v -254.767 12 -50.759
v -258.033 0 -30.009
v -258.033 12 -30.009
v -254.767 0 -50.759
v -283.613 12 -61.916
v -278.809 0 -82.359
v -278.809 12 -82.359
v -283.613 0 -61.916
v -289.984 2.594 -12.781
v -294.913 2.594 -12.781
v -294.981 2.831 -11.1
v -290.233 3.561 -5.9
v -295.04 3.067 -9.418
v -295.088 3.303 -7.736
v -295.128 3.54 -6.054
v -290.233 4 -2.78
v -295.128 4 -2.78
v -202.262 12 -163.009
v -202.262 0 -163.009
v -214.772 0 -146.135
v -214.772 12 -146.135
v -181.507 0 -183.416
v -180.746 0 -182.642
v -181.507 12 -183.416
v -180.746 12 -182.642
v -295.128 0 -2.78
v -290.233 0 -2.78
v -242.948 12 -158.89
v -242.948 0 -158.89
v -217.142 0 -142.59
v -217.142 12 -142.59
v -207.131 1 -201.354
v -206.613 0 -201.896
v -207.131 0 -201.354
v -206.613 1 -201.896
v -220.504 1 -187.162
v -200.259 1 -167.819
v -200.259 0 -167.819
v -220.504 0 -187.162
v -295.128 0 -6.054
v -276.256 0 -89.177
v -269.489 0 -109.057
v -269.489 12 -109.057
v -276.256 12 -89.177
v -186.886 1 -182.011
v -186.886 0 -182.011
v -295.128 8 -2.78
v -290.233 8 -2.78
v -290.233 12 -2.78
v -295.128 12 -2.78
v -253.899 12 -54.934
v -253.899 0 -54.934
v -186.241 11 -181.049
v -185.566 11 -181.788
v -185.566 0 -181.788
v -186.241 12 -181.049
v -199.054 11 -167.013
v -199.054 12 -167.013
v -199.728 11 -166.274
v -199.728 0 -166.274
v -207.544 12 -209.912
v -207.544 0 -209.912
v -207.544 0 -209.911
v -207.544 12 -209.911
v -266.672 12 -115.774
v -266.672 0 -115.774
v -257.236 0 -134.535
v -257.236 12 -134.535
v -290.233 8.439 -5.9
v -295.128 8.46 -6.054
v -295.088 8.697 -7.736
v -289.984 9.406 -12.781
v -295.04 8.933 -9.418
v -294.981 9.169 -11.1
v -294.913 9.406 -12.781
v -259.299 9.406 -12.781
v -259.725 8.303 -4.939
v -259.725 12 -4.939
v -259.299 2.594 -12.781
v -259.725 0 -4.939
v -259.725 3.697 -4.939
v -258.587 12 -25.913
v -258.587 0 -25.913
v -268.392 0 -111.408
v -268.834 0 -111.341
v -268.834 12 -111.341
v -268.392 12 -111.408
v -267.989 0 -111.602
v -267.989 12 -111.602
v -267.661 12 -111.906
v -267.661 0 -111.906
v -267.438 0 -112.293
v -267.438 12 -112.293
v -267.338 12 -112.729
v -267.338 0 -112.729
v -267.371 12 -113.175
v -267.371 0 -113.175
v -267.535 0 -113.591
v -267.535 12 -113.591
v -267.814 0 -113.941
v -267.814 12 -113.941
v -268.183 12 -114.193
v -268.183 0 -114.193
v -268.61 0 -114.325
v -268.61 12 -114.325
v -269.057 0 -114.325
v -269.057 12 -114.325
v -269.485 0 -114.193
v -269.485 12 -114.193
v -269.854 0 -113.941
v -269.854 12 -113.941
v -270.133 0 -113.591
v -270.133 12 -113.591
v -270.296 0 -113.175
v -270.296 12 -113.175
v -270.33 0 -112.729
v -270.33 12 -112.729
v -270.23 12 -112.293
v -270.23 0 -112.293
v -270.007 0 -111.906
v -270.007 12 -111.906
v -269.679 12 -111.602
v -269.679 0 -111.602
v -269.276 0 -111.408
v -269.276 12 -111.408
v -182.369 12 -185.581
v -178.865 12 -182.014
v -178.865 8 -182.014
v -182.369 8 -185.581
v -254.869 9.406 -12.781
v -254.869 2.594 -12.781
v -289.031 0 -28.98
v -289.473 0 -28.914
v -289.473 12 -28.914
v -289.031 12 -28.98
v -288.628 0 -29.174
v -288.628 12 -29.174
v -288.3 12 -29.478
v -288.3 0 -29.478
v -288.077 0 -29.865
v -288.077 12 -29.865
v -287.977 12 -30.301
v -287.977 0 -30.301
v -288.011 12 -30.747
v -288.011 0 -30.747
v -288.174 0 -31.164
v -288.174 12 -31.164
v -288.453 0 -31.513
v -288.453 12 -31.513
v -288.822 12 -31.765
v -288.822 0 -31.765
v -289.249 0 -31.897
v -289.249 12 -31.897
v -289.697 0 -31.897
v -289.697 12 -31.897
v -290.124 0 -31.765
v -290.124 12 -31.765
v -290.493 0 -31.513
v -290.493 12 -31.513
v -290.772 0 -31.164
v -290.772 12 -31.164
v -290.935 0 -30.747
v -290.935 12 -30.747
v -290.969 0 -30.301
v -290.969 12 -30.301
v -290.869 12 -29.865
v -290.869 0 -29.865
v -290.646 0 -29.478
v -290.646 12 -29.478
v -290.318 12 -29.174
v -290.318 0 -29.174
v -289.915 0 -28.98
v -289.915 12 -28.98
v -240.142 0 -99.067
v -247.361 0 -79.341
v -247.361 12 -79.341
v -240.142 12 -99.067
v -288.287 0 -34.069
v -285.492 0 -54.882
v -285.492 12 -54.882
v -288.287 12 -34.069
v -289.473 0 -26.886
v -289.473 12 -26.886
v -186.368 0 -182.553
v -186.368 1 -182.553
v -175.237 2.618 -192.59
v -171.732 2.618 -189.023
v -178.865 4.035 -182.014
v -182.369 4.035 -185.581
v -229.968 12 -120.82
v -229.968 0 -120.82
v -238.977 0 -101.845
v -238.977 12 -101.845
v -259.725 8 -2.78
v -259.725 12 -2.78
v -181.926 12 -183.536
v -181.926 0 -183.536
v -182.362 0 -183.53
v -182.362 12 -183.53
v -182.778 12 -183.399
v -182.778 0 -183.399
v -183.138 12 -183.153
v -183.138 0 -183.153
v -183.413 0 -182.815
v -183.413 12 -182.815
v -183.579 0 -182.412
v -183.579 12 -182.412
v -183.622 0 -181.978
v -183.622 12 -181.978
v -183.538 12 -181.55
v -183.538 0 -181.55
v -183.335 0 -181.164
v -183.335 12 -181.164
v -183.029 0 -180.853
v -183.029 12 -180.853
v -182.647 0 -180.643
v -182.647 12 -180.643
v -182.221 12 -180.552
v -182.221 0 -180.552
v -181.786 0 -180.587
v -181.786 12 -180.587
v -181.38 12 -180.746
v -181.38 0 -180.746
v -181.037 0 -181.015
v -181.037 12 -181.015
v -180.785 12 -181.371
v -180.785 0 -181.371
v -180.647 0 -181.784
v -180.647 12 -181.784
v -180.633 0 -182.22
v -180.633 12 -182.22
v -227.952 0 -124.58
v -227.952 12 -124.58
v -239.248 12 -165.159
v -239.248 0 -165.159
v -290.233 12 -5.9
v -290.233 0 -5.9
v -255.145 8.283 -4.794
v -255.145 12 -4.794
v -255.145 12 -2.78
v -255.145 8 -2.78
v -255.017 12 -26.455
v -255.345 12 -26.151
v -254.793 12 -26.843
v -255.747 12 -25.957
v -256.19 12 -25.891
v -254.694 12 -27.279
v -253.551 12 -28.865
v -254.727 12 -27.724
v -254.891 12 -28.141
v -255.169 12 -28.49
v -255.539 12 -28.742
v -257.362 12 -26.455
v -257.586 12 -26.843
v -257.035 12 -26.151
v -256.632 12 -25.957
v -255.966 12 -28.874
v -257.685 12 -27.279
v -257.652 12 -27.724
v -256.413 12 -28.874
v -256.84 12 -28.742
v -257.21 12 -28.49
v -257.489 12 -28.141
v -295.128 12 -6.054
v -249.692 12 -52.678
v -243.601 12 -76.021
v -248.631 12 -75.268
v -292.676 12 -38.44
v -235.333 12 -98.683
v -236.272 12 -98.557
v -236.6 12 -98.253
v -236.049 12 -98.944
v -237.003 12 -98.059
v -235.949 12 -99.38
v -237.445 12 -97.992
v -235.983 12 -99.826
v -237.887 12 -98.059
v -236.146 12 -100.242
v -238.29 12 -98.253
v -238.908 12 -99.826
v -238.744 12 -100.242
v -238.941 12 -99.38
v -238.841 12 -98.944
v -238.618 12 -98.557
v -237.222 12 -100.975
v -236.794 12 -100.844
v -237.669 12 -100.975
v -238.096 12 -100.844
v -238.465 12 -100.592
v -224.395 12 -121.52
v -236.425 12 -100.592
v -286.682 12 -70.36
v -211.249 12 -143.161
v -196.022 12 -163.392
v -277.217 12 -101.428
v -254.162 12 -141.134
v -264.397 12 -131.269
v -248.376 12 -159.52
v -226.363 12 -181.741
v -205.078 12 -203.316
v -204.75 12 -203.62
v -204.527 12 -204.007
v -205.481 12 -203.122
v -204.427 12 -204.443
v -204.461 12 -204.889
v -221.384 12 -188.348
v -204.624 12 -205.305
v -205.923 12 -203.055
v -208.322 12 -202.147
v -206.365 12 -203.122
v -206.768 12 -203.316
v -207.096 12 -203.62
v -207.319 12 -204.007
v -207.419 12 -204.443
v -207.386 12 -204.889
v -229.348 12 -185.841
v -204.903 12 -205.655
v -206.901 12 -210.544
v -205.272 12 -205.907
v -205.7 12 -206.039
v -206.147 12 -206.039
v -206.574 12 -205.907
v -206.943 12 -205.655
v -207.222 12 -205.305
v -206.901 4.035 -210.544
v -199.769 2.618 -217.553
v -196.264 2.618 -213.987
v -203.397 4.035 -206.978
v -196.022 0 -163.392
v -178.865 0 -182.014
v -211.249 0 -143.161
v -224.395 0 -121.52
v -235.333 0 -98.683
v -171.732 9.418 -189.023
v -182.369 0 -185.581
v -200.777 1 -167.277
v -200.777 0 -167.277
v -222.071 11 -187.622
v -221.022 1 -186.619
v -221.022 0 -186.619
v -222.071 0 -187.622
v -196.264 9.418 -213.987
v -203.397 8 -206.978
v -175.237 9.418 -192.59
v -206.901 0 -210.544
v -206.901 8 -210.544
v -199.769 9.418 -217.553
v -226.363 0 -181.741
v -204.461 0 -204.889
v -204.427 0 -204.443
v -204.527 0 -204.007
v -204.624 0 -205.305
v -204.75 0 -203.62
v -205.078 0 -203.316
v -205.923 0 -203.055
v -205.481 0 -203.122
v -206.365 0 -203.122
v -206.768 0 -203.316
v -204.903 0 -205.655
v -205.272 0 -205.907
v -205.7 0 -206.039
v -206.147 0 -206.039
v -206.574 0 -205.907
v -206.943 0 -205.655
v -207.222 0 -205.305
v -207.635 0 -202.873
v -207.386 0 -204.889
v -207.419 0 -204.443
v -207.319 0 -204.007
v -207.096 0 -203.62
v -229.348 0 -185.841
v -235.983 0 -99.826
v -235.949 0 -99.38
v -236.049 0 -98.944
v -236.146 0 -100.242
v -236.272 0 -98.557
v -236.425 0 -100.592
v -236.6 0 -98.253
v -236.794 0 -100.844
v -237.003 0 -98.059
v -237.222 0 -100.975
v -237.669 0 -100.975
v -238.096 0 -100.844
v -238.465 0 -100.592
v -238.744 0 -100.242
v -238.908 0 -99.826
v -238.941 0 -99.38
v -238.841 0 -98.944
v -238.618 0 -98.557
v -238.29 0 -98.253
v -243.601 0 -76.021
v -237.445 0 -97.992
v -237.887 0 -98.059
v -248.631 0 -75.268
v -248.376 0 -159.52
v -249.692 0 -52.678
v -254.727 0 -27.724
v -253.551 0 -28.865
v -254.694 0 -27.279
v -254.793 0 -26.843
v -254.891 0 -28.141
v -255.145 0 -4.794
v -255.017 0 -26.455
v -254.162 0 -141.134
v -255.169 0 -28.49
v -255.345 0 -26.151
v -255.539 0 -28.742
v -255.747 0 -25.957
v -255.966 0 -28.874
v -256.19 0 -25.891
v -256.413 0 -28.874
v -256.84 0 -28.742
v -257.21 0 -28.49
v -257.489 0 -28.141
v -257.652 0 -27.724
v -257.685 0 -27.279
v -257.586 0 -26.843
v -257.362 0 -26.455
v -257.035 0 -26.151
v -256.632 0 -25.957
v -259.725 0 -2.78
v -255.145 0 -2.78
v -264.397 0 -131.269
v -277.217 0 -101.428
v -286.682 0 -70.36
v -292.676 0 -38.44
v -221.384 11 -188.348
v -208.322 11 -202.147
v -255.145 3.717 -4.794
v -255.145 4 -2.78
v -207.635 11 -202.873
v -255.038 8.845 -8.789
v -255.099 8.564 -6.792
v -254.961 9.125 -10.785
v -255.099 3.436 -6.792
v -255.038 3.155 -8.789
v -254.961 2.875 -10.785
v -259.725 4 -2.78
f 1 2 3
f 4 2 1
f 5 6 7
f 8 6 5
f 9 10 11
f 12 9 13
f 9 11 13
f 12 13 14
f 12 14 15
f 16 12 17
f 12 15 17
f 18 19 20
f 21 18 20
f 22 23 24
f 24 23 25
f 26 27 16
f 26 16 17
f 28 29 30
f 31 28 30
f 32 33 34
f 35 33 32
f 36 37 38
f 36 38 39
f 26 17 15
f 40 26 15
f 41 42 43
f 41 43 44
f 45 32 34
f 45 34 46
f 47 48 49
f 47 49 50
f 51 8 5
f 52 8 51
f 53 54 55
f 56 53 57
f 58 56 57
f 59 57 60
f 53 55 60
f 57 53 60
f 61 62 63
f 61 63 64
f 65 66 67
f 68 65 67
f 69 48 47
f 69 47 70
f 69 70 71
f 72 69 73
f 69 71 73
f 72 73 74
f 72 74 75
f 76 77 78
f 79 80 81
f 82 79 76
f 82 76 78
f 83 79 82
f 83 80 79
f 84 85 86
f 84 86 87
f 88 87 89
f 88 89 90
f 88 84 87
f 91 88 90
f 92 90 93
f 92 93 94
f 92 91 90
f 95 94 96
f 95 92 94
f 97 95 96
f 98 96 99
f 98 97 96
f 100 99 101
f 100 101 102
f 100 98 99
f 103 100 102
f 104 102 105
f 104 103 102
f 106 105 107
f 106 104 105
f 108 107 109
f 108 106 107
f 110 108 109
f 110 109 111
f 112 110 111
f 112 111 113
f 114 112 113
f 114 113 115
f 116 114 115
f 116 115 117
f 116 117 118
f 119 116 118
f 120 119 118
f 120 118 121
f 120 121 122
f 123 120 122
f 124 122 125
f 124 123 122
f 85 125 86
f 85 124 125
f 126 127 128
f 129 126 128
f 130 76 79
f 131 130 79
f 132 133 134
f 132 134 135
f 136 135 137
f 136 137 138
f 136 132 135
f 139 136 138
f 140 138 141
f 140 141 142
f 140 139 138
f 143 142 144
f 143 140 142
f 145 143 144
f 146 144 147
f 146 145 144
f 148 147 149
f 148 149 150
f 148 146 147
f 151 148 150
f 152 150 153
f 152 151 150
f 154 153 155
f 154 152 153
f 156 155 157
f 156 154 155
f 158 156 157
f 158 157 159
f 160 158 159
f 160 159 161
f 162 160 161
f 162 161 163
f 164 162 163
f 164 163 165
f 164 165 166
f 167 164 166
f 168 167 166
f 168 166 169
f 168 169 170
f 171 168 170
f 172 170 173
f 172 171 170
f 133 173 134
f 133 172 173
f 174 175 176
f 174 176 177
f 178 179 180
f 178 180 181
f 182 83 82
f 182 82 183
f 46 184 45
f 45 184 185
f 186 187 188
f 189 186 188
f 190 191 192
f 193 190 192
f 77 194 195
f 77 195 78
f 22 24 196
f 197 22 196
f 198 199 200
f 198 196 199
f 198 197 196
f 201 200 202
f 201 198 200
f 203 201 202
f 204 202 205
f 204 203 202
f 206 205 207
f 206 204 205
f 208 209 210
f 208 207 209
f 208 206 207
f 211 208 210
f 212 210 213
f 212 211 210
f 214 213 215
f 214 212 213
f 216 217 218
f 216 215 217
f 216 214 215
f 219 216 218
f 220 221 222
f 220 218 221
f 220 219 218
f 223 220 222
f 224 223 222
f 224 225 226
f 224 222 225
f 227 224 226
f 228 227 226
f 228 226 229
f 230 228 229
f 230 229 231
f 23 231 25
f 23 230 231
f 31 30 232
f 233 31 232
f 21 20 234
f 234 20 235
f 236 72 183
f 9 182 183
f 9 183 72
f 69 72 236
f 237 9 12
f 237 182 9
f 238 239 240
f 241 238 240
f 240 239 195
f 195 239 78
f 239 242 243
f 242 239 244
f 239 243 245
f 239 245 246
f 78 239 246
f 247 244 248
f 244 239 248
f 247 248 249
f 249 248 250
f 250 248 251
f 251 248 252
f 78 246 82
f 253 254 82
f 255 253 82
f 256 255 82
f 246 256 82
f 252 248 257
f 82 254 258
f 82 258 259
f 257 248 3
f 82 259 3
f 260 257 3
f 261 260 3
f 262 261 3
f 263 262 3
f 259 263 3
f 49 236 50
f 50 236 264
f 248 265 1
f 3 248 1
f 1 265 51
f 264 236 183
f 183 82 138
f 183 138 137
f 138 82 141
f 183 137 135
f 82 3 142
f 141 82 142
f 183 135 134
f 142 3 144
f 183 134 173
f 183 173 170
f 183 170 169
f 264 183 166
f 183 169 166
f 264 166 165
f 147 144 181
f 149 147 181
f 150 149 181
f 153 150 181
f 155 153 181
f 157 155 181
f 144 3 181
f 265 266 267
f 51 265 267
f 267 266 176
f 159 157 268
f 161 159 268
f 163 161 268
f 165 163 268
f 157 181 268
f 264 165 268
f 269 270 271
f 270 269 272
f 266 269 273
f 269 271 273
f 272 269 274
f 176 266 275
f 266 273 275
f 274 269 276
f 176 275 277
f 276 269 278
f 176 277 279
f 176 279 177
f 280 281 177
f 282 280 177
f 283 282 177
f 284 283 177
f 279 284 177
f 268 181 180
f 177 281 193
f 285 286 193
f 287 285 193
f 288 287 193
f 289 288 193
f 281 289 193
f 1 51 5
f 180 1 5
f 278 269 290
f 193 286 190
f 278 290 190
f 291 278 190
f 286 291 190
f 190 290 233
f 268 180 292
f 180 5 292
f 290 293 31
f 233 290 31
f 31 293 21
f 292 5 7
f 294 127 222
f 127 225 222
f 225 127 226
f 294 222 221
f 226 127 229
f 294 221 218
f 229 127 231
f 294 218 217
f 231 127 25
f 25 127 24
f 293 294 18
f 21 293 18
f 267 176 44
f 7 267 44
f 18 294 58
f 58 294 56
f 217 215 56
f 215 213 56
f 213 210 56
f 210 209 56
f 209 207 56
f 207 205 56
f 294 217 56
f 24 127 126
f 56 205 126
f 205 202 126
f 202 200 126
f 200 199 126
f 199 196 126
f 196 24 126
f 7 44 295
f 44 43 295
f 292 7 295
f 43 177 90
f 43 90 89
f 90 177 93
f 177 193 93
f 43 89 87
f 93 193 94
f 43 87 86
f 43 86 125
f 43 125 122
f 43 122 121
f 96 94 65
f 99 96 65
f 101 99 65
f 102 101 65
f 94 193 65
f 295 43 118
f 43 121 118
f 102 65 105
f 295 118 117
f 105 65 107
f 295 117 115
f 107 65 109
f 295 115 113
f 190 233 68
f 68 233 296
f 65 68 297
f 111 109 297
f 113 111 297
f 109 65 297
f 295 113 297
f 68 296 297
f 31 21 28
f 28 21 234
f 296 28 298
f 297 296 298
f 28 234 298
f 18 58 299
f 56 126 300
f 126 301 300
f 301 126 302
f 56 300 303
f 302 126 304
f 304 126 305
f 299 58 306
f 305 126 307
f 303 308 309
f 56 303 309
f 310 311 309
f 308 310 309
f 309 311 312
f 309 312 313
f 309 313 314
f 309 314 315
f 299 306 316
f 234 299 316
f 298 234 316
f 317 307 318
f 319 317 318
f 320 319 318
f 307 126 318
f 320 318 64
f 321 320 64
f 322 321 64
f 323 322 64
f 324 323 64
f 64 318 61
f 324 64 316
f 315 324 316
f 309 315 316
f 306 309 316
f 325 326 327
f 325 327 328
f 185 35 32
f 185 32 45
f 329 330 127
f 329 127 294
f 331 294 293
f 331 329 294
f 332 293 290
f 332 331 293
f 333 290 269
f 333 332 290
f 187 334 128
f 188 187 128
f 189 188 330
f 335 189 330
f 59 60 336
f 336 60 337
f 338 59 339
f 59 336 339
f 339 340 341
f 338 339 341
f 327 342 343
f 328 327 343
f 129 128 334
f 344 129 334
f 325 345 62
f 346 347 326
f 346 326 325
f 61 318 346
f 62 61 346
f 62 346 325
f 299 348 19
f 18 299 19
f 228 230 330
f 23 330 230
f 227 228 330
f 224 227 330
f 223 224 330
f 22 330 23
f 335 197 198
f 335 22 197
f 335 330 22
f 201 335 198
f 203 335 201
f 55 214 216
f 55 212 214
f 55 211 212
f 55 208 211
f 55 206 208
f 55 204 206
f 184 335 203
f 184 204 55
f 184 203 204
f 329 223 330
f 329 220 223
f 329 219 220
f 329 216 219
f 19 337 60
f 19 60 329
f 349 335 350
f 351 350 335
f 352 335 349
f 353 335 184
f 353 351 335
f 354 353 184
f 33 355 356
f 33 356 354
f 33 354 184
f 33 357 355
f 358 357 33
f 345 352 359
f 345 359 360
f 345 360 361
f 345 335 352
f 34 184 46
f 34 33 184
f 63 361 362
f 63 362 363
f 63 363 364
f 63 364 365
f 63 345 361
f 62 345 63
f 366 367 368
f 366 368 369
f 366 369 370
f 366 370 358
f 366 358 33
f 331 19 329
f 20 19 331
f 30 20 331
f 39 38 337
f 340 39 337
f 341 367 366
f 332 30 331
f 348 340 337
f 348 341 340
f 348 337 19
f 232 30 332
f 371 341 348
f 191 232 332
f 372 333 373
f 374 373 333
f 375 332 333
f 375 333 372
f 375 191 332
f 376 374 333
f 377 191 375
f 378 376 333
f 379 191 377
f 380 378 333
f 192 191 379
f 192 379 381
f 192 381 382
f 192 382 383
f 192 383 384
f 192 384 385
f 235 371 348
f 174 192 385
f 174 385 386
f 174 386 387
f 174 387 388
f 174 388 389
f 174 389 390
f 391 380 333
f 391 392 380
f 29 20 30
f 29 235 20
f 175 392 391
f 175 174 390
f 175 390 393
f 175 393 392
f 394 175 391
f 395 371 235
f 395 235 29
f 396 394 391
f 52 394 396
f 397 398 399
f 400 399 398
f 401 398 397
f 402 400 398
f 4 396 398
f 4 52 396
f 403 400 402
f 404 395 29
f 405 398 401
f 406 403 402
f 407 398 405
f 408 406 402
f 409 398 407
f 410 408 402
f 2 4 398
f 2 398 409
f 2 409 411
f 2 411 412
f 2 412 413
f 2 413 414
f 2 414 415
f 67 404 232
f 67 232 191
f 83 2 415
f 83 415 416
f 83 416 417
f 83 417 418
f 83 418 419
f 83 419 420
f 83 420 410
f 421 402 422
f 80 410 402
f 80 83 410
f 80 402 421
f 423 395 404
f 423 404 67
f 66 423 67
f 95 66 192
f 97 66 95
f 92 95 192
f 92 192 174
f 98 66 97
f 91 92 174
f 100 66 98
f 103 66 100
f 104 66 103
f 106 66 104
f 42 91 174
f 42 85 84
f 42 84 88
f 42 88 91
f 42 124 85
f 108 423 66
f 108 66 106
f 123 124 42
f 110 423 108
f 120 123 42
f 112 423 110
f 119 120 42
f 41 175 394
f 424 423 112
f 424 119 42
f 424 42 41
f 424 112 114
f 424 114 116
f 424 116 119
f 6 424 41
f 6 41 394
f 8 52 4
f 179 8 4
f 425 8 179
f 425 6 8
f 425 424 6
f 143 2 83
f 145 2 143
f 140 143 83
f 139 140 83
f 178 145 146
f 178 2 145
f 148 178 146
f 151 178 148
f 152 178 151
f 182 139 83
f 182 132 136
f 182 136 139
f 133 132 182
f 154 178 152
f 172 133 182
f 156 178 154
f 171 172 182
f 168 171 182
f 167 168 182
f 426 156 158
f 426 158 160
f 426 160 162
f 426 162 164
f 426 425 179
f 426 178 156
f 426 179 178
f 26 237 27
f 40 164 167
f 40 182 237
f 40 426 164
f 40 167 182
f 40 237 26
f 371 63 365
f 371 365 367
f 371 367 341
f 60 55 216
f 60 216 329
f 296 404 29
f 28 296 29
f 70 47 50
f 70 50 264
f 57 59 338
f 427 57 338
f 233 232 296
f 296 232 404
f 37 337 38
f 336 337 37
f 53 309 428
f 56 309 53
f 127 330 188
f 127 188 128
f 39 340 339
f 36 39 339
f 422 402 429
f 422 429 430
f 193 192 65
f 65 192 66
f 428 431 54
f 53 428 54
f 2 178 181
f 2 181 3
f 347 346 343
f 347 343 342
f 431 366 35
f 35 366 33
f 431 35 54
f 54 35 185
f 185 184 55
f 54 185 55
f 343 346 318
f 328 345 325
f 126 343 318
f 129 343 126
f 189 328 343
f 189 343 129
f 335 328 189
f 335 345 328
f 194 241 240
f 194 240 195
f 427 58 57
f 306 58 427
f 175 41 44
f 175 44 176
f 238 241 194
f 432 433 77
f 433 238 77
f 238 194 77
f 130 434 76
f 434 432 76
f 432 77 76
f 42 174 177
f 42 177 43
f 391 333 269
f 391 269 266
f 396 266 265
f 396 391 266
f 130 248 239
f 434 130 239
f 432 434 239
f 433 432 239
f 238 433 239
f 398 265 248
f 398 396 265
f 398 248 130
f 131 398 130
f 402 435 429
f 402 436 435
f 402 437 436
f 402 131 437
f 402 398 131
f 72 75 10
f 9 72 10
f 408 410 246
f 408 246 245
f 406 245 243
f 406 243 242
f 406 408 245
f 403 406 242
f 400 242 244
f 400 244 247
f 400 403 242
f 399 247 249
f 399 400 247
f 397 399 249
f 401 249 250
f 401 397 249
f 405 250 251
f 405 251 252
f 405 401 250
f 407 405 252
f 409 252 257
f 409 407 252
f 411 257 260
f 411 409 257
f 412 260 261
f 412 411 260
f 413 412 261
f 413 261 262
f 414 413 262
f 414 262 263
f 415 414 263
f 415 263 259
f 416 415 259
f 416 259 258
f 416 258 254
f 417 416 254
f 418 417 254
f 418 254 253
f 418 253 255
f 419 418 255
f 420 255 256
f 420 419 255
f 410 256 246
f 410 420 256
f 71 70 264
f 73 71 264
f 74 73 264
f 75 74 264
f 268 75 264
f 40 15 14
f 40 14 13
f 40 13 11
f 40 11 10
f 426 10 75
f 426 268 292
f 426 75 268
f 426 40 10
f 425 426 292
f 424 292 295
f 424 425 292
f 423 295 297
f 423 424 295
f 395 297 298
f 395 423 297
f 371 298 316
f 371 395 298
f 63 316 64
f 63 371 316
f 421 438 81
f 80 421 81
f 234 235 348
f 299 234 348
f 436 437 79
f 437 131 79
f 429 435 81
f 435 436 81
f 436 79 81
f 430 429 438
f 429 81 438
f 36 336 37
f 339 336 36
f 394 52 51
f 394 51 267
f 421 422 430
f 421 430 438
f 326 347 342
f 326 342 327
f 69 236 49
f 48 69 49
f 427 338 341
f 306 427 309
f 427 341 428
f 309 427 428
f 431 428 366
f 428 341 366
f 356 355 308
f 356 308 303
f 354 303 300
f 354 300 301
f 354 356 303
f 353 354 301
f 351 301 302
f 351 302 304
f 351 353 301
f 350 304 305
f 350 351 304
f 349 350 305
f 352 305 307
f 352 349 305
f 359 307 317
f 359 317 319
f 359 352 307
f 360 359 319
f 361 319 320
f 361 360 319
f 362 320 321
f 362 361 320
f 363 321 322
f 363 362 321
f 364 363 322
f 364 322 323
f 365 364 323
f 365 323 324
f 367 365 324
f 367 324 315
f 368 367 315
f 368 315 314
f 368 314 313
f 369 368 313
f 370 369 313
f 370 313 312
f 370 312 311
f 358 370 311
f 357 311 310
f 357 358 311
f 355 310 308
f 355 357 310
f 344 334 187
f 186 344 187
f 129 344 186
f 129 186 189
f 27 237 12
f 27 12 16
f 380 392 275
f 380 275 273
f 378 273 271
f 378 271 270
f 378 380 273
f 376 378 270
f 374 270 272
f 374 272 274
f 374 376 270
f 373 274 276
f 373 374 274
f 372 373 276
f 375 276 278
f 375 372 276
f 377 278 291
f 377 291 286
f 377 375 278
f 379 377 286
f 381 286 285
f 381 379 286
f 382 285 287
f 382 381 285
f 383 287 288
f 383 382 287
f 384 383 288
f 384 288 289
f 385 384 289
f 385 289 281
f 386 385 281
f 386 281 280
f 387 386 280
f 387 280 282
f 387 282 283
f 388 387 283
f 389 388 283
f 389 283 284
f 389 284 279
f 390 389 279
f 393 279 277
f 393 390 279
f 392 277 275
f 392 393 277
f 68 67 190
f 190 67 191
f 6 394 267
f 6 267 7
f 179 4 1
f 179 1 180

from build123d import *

# Parameters (mm, degrees)
SKETCH1_R           = 1.500000001
SKETCH1_R_2         = 1.5
BOSS_EXTRUDE1_DEPTH = 12
SKETCH6_W           = 31
SKETCH6_H           = 1
BOSS_EXTRUDE2_DEPTH = 1
SKETCH7_W           = 31
SKETCH7_H           = 1
BOSS_EXTRUDE3_DEPTH = 1
SKETCH8_W           = 28
SKETCH8_H           = 1
BOSS_EXTRUDE4_DEPTH = 0.75
SKETCH9_W           = 28
SKETCH9_H           = 1
BOSS_EXTRUDE5_DEPTH = 0.75
CUT_EXTRUDE5_DEPTH  = 41
BOSS_EXTRUDE6_DEPTH = 5


with BuildPart() as part:
    # Sketch1 → Boss-Extrude1 (new body)
    with BuildSketch(Plane(origin=(0, 0, 0), x_dir=(1, 0, 0), z_dir=(0, 1, 0))):
        with BuildLine():
            Line((-206.901303799, 210.544296342), (-178.864917553, 182.014262429))
            ThreePointArc((-178.864917553, 182.014262429), (-211.248528729, 143.160707083), (-235.332727793, 98.683202756))
            ThreePointArc((-235.332727793, 98.683202756), (-249.691560201, 52.678328759), (-255.14463702, 4.794213931))
            Line((-255.14463702, 4.794213931), (-255.14463702, 2.779626552))
            Line((-255.14463702, 2.779626552), (-259.725038425, 2.779626552))
            Line((-259.725038425, 2.779626552), (-259.725038425, 4.938563385))
            Line((-259.725038425, 4.938563385), (-258.586614607, 25.913112119))
            Line((-258.586614607, 25.913112119), (-289.472992235, 26.886483517))
            Line((-289.472992235, 26.886483517), (-290.232709847, 5.900000013))
            Line((-290.232709847, 5.900000013), (-290.232709847, 2.779626551))
            Line((-290.232709847, 2.779626551), (-295.127762341, 2.779626551))
            Line((-295.127762341, 2.779626551), (-295.127762341, 6.054265565))
            ThreePointArc((-295.127762341, 6.054265565), (-271.03936796, 116.93892103), (-206.901303799, 210.544296342))
        make_face()
        with Locations(Location((-205.923171716, 204.555428223, 0), (0, 0, 270))):
            Circle(SKETCH1_R, mode=Mode.SUBTRACT)
        with Locations(Location((-182.123524849, 182.048793456, 0), (0, 0, 270))):
            Circle(SKETCH1_R_2, mode=Mode.SUBTRACT)
        with Locations(Location((-289.472992235, 30.413510705, 0), (0, 0, 270))):
            Circle(SKETCH1_R_2, mode=Mode.SUBTRACT)
        with Locations(Location((-256.189573648, 27.390600482, 0), (0, 0, 270))):
            Circle(SKETCH1_R_2, mode=Mode.SUBTRACT)
        with Locations(Location((-237.445118633, 99.492127605, 0), (0, 0, 270))):
            Circle(SKETCH1_R_2, mode=Mode.SUBTRACT)
        with Locations(Location((-268.833815416, 112.841343478, 0), (0, 0, 270))):
            Circle(SKETCH1_R_2, mode=Mode.SUBTRACT)
        Polygon((-288.286547304, 34.069084362), (-258.033222279, 30.008925637), (-254.767009525, 50.758854735), (-285.491553173, 54.882253531), align=None, mode=Mode.SUBTRACT)
        Polygon((-283.612878523, 61.915838046), (-253.89939669, 54.933619681), (-248.631031599, 75.267631401), (-278.809043274, 82.359007245), align=None, mode=Mode.SUBTRACT)
        Polygon((-276.255921554, 89.176800074), (-247.361344598, 79.340855863), (-240.142390382, 99.066838813), (-269.488694715, 109.056554622), align=None, mode=Mode.SUBTRACT)
        Polygon((-229.967759139, 120.819849226), (-238.977493449, 101.844802692), (-266.671759318, 115.77418308), (-257.235727442, 134.534814797), align=None, mode=Mode.SUBTRACT)
        Polygon((-217.141868251, 142.590375773), (-227.952465343, 124.580414811), (-254.16244031, 141.134484167), (-242.948393328, 158.889628499), align=None, mode=Mode.SUBTRACT)
        Polygon((-202.261755682, 163.008777697), (-214.772333152, 146.135332444), (-239.248466479, 165.159498585), (-226.362501502, 181.741172494), align=None, mode=Mode.SUBTRACT)
        Polygon((-185.566118156, 181.787515485), (-199.72829266, 166.274278663), (-222.071098467, 187.621756348), (-207.634972794, 202.873245989), align=None, mode=Mode.SUBTRACT)
    extrude(amount=BOSS_EXTRUDE1_DEPTH)

    # Sketch6 → Boss-Extrude2 (add)
    with BuildSketch(Plane(origin=(2.241673695, 0, -2.346191939), x_dir=(0.7230281012906209, 0, 0.6908186192801116), z_dir=(-0.6908186192801116, 0, 0.7230281012906209))):
        with Locations((-275.013127173, 11.5)):
            Rectangle(SKETCH6_W, SKETCH6_H)
    extrude(amount=BOSS_EXTRUDE2_DEPTH)

    # Sketch7 → Boss-Extrude3 (add)
    with BuildSketch(Plane(origin=(-12.265517311, 0, 12.83739819), x_dir=(-0.7230281012906384, 0, -0.6908186192800932), z_dir=(0.6908186192800932, 0, -0.7230281012906384))):
        with Locations((274.725391583, 11.5)):
            Rectangle(SKETCH7_W, SKETCH7_H)
    extrude(amount=BOSS_EXTRUDE3_DEPTH)

    # Sketch8 → Boss-Extrude4 (add)
    with BuildSketch(Plane(origin=(-12.265517311, 0, 12.83739819), x_dir=(-0.7230281012906384, 0, -0.6908186192800932), z_dir=(0.6908186192800932, 0, -0.7230281012906384))):
        with Locations((274.725391583, 0.5)):
            Rectangle(SKETCH8_W, SKETCH8_H)
    extrude(amount=BOSS_EXTRUDE4_DEPTH)

    # Sketch9 → Boss-Extrude5 (add)
    with BuildSketch(Plane(origin=(2.241673695, 0, -2.346191939), x_dir=(0.7230281012906209, 0, 0.6908186192801116), z_dir=(-0.6908186192801116, 0, 0.7230281012906209))):
        with Locations((-274.86046651, 0.5)):
            Rectangle(SKETCH9_W, SKETCH9_H)
    extrude(amount=BOSS_EXTRUDE5_DEPTH)

    # Sketch10 → Cut-Extrude5 (cut)
    with BuildSketch(Plane.ZY.offset(295.127762341)):
        Polygon((-2.779626551, 12), (-2.779626551, 8), (-12.781334045, 9.40564832), (-12.781334045, 2.59435168), (-2.779626551, 4), (-2.779626551, 0), (4.575602147, 0), (4.575602147, 12), align=None)
    extrude(amount=-CUT_EXTRUDE5_DEPTH, mode=Mode.SUBTRACT)

    # Sketch12 → Boss-Extrude6 (add)
    with BuildSketch(Plane(origin=(-206.901303799, 0, -210.544296342), x_dir=(-0.7132504491210117, 0, 0.700909264333605), z_dir=(-0.700909264333605, 0, -0.7132504491210117))):
        Polygon((0, 12), (0, 8), (-10, 9.417744688), (-10, 2.617744688), (0, 4.035489376), (0, 0), (0.901744135, 0), (0.901744135, 12), align=None)
    boss_extrude6 = extrude(amount=-BOSS_EXTRUDE6_DEPTH)

    # Mirror2: Boss-Extrude6 across plane
    add(boss_extrude6.mirror(Plane(origin=(-192.883118513, 0, -196.27928736), x_dir=(-0.7132504491210118, 0, 0.7009092643336048), z_dir=(-0.700909264333605, 0, -0.7132504491210117))))


solid = part.part
